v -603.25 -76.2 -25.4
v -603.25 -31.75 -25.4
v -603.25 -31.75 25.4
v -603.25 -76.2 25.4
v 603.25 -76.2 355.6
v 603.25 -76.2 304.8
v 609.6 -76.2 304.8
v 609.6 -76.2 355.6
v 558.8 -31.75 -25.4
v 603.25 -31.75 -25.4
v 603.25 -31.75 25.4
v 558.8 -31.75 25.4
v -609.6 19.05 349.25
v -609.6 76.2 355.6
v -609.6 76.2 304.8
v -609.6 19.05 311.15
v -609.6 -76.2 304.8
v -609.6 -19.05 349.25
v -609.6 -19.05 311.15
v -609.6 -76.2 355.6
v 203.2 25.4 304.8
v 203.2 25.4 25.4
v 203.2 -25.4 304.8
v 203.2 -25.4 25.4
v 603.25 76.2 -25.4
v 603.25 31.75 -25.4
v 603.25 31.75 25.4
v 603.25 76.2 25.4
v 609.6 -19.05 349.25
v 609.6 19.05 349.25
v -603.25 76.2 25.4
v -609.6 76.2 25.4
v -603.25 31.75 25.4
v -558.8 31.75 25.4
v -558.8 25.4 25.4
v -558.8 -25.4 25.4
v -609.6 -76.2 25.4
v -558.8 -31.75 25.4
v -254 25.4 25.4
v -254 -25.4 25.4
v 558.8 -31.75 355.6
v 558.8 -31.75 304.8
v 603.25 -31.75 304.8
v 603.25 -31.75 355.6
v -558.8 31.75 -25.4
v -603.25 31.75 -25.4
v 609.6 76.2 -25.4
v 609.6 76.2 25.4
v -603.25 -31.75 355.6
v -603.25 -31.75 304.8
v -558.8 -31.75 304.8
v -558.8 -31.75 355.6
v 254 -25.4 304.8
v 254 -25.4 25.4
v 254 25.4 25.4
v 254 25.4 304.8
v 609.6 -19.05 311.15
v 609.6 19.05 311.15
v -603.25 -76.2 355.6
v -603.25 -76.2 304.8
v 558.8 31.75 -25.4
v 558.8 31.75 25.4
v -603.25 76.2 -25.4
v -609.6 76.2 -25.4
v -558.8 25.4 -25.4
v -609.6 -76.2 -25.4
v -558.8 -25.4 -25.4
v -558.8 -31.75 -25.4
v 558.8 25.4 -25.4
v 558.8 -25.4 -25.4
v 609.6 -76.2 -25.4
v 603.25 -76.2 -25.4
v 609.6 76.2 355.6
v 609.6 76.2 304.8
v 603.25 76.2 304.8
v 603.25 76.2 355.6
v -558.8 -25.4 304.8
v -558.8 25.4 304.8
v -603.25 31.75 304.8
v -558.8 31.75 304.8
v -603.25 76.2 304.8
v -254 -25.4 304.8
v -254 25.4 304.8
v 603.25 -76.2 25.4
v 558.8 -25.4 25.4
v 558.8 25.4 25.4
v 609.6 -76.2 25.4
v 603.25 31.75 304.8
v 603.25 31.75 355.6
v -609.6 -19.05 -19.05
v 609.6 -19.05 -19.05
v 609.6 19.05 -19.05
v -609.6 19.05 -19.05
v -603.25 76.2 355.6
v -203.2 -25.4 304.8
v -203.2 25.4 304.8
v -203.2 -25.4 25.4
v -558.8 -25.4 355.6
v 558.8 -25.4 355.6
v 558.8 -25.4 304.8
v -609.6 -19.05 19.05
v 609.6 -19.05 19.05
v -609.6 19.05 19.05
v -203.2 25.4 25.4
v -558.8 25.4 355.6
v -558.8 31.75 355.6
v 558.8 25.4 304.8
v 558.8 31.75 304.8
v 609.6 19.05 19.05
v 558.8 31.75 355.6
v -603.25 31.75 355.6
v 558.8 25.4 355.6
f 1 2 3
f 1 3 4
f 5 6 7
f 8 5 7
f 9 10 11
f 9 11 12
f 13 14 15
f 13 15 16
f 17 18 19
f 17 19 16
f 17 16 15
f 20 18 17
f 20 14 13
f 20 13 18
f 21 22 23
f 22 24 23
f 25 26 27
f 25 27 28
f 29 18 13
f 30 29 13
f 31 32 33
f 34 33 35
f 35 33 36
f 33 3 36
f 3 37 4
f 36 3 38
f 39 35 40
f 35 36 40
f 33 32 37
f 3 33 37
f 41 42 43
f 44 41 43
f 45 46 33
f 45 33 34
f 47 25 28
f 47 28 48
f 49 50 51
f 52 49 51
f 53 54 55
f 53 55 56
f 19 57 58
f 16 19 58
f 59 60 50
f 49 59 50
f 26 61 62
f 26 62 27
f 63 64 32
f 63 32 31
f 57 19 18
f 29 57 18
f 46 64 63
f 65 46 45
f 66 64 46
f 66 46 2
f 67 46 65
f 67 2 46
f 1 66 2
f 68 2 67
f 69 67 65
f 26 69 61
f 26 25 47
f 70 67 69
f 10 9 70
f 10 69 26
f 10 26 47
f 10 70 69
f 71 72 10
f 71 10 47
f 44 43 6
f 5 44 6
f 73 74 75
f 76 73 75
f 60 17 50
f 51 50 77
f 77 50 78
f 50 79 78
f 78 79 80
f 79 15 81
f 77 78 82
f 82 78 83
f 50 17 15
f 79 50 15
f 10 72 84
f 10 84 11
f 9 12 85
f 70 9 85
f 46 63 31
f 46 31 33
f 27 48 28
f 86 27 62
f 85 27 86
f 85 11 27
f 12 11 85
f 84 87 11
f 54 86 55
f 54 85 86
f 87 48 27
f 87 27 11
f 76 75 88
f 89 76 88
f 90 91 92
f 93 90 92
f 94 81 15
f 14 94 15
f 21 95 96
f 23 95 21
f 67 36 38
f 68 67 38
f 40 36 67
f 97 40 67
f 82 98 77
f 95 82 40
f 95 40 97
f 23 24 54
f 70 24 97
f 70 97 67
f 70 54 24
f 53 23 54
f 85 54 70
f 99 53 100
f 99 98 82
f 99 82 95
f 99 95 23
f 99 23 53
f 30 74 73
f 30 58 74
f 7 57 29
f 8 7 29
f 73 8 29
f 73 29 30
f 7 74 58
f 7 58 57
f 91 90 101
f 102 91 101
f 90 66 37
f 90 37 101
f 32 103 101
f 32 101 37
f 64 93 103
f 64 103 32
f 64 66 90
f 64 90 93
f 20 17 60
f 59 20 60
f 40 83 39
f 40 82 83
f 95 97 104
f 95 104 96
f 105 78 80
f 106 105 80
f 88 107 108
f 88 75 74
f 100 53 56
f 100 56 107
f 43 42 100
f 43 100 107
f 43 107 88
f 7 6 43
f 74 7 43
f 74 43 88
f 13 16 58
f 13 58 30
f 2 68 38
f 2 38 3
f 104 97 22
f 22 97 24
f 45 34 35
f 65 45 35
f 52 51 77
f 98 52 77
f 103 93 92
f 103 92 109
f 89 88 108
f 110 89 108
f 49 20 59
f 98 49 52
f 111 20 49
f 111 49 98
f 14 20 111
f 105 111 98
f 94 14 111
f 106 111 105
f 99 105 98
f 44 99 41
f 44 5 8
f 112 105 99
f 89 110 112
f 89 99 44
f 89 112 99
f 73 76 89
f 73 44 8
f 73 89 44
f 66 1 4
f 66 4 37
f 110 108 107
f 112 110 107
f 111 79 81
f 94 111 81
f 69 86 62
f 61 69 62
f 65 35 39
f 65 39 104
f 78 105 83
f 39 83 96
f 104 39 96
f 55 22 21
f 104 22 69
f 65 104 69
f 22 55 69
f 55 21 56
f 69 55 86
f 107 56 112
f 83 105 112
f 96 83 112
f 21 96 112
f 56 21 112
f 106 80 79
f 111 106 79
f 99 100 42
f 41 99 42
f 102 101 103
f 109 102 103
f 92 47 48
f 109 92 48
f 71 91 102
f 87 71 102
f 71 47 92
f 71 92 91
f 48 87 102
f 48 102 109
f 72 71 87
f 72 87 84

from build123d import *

# Parameters (mm, degrees)
F0_W     = 406.4
F0_H     = 279.4
F1_DEPTH = 25.4
F3_DEPTH = 50.8
F5_DEPTH = 50.8
F6_W     = 38.1
F6_H     = 38.1
F7_DEPTH = 1270


with BuildPart() as f1:
    # F0 (on Front) → F1 (new body, symmetric)
    with BuildSketch(Plane.XZ):
        Polygon((-254, 25.4), (-609.6, 25.4), (-609.6, -25.4), (609.6, -25.4), (609.6, 25.4), (254, 25.4), (254, 304.8), (609.6, 304.8), (609.6, 355.6), (-609.6, 355.6), (-609.6, 304.8), (-254, 304.8), align=None)
        with Locations((0, 165.1)):
            Rectangle(F0_W, F0_H, mode=Mode.SUBTRACT)
    extrude(amount=F1_DEPTH, both=True)

    # F2 (on face) → F3 (join)
    with BuildSketch(Plane.XY.offset(355.6)):
        Polygon((-609.6, 76.2), (-609.6, 25.4), (-603.25, 25.4), (-558.8, 25.4), (-558.8, 31.75), (-603.25, 31.75), (-603.25, 76.2), align=None)
        Polygon((-609.6, -25.4), (-609.6, -76.2), (-603.25, -76.2), (-603.25, -31.75), (-558.8, -31.75), (-558.8, -25.4), (-603.25, -25.4), align=None)
        Polygon((603.25, -25.4), (558.8, -25.4), (558.8, -31.75), (603.25, -31.75), (603.25, -76.2), (609.6, -76.2), (609.6, -25.4), align=None)
        Polygon((603.25, 25.4), (609.6, 25.4), (609.6, 76.2), (603.25, 76.2), (603.25, 31.75), (558.8, 31.75), (558.8, 25.4), align=None)
    extrude(amount=-F3_DEPTH)

    # F4 (on face) → F5 (join)
    with BuildSketch(Plane(origin=(0, 0, -25.4), x_dir=(1, 0, 0), z_dir=(0, 0, -1))):
        Polygon((-603.25, -76.2), (-603.25, -31.75), (-558.8, -31.75), (-558.8, -25.4), (-603.25, -25.4), (-609.6, -25.4), (-609.6, -76.2), align=None)
        Polygon((-558.8, 31.75), (-603.25, 31.75), (-603.25, 76.2), (-609.6, 76.2), (-609.6, 25.4), (-603.25, 25.4), (-558.8, 25.4), align=None)
        Polygon((558.8, 25.4), (603.25, 25.4), (609.6, 25.4), (609.6, 76.2), (603.25, 76.2), (603.25, 31.75), (558.8, 31.75), align=None)
        Polygon((558.8, -31.75), (603.25, -31.75), (603.25, -76.2), (609.6, -76.2), (609.6, -25.4), (603.25, -25.4), (558.8, -25.4), align=None)
    extrude(amount=-F5_DEPTH)

    # F6 (on Right) → F7 (cut, symmetric)
    with BuildSketch(Plane.YZ):
        with Locations((0, 330.2)):
            Rectangle(F6_W, F6_H)
        Rectangle(F6_W, F6_H)
    extrude(amount=F7_DEPTH, both=True, mode=Mode.SUBTRACT)


solid = f1.part
